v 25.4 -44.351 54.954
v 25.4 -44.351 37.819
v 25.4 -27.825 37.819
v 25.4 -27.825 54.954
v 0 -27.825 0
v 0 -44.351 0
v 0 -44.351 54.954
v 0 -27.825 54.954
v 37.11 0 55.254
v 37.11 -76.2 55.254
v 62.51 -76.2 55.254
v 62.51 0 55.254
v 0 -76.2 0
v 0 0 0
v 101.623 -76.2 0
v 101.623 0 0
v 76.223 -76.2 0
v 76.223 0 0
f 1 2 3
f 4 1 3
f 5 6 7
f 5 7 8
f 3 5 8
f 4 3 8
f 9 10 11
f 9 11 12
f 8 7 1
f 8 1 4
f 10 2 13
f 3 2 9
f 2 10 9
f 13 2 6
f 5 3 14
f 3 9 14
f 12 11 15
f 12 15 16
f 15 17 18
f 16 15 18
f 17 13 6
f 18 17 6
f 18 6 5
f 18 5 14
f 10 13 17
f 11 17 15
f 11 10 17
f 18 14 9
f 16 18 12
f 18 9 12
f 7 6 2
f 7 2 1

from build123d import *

# Parameters (mm, degrees)
F1_DEPTH  = 76.2
F2_W      = 16.5251810104
F2_H      = 54.9541674554
F1_FACE_W = 76.2
F1_FACE_H = 67.6971774679
F3_DEPTH  = 25.4


with BuildPart() as f1:
    # F0 (on Front) → F1 (new body)
    with BuildSketch(Plane.XZ):
        Polygon((76.2232616544, 0), (37.109632045, 55.2542470396), (0, 0), align=None)
    extrude(amount=F1_DEPTH)

    # F2 (on Right) + F1_face (on face) → F3 (join)
    with BuildSketch(Plane.YZ):
        with Locations((-36.0880820081, 27.4770837277)):
            Rectangle(F2_W, F2_H)
    with BuildSketch(Plane(origin=(56.6664468497, -38.1, 27.6271235198), x_dir=(0, 1, 0), z_dir=(0.8161972051, 0, 0.5777734179))):
        Rectangle(F1_FACE_W, F1_FACE_H)
    extrude(amount=F3_DEPTH, dir=(1, 0, 0))


solid = f1.part
